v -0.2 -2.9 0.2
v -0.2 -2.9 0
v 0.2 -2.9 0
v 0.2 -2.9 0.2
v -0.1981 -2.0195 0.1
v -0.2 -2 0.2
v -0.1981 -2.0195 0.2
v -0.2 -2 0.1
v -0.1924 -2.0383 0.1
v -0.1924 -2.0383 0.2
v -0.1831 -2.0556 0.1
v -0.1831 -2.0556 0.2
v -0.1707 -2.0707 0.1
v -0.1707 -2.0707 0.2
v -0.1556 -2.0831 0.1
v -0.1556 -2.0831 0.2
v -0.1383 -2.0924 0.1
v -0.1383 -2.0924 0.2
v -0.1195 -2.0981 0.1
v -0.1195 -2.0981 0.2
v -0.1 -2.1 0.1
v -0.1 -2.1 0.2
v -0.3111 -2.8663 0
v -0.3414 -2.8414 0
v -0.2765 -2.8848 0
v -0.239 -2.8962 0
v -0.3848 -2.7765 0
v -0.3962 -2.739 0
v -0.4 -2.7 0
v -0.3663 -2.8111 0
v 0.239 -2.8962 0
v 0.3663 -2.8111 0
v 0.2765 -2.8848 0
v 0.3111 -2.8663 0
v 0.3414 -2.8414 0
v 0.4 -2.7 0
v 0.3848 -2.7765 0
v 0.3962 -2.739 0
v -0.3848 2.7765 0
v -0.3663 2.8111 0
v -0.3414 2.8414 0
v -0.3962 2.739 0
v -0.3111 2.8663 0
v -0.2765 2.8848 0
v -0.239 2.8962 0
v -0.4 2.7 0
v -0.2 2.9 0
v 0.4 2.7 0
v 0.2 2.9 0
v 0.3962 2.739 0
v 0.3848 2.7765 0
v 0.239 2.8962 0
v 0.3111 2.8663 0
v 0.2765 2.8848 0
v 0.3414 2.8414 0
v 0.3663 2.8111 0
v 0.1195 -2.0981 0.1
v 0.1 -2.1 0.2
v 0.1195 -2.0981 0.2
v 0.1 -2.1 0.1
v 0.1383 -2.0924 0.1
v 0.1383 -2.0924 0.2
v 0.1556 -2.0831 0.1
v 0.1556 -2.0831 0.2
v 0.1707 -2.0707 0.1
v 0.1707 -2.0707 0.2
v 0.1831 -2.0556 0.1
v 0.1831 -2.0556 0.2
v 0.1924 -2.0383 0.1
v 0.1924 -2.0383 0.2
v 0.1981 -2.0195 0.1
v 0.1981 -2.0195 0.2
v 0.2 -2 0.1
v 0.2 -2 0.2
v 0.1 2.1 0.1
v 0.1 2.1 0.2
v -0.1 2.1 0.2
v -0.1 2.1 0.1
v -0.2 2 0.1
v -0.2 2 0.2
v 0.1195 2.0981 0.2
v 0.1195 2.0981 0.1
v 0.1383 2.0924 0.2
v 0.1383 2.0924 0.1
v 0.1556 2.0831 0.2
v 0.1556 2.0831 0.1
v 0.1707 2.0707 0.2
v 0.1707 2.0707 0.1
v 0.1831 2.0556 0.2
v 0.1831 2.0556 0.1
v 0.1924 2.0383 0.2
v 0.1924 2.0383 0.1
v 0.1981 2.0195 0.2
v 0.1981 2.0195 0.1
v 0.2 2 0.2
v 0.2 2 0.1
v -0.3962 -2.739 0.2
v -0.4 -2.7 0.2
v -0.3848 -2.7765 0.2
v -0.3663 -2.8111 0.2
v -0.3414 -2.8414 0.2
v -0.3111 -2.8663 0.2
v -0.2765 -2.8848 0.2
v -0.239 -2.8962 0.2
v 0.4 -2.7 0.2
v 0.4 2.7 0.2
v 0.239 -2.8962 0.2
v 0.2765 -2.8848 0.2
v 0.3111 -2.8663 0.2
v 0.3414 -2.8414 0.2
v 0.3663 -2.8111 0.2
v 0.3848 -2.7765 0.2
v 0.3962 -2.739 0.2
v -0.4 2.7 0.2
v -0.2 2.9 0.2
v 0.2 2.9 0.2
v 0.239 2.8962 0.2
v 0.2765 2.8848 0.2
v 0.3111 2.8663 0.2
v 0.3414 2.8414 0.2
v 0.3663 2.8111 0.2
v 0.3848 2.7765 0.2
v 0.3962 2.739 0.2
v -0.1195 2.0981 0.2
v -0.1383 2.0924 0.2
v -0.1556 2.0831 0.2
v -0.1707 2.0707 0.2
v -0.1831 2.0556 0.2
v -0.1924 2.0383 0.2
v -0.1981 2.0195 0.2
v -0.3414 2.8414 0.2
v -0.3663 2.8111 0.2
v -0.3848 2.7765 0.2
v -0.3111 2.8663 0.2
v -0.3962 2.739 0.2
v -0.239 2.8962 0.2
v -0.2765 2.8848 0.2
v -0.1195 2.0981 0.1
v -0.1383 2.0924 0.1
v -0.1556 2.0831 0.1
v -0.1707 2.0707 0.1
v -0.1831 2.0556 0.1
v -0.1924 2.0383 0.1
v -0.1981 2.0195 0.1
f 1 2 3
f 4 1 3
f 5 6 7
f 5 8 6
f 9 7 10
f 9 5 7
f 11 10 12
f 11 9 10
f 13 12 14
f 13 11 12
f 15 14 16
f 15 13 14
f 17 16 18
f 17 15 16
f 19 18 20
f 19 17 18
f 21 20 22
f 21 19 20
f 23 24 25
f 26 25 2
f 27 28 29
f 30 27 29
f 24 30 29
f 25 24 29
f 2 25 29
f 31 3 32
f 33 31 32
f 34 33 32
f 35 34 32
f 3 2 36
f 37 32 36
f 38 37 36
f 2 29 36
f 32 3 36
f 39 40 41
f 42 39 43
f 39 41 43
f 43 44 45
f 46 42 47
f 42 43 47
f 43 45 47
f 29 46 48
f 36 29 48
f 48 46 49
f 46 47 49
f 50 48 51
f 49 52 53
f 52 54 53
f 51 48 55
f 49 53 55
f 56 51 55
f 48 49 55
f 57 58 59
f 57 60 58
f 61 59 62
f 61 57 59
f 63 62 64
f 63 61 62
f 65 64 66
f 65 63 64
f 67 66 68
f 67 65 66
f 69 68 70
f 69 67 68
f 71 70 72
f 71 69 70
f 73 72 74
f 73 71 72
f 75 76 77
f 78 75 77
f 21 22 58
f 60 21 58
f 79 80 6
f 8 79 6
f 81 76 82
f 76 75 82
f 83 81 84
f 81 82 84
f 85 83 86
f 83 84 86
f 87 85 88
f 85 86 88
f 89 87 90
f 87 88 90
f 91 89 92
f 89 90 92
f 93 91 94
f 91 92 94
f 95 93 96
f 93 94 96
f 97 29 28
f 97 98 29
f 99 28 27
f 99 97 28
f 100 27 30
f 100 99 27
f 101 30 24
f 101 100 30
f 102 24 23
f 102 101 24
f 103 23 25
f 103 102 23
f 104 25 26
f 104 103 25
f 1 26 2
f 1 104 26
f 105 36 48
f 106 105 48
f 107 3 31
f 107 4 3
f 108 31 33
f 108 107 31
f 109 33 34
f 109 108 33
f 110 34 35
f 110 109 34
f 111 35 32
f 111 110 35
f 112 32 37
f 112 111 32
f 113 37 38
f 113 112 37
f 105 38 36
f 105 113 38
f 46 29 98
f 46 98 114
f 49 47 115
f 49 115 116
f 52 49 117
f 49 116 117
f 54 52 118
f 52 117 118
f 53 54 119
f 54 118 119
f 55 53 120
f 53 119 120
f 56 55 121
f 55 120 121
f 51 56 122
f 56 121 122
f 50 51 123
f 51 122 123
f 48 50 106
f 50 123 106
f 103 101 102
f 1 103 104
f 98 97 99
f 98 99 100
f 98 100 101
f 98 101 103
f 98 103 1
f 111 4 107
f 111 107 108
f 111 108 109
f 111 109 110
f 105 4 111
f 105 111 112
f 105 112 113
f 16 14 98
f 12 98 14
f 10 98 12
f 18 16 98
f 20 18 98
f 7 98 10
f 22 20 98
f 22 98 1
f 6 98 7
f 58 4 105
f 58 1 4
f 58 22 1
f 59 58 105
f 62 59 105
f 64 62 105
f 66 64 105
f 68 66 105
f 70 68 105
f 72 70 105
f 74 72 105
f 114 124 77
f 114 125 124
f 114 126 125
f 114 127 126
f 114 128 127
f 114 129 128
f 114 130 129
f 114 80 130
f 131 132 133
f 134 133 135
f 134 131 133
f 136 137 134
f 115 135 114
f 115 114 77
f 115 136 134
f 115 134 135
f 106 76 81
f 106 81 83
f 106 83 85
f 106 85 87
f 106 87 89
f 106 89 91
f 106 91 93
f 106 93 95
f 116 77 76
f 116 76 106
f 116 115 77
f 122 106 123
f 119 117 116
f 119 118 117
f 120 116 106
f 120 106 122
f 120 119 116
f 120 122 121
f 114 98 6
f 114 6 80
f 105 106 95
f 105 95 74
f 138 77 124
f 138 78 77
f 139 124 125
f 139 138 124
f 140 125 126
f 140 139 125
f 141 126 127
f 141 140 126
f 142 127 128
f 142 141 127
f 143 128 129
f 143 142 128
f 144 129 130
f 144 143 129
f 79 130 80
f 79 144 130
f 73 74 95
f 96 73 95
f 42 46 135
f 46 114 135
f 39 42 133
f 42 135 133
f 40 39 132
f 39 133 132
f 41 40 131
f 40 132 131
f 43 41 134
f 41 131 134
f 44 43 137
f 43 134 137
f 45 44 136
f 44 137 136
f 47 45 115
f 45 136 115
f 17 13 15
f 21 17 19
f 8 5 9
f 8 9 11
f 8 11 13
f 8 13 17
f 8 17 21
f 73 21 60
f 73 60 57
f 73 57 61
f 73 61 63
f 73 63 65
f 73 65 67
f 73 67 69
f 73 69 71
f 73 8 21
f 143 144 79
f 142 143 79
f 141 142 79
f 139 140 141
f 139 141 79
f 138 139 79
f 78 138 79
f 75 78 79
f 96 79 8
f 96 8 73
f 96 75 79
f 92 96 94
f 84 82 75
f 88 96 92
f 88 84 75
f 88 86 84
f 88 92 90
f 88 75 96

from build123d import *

# Parameters (mm, degrees)
F0_W     = 0.8
F0_H     = 5.8
F1_DEPTH = 0.2
F3_DEPTH = 0.1
F4_R     = 0.2
F5_R     = 0.1


with BuildPart() as f1:
    # F0 (on Top) → F1 (new body)
    with BuildSketch(Plane.XY):
        Rectangle(F0_W, F0_H)
    extrude(amount=F1_DEPTH)

    # F2 (on face) → F3 (cut)
    with BuildSketch(Plane.XY.offset(0.2)):
        Polygon((0.2, 2.1), (0, 2.1), (-0.2, 2.1), (-0.2, -2.1), (0, -2.1), (0.2, -2.1), align=None)
    extrude(amount=-F3_DEPTH, mode=Mode.SUBTRACT)

    # F4
    f4_edges = [f1.edges().sort_by_distance(p)[0] for p in [
        (0.4, 2.9, 0.1),
        (-0.4, 2.9, 0.1),
        (0.4, -2.9, 0.1),
        (-0.4, -2.9, 0.1),
    ]]
    fillet(f4_edges, radius=F4_R)

    # F5
    f5_edges = [f1.edges().sort_by_distance(p)[0] for p in [
        (0.2, 2.1, 0.15),
        (-0.2, 2.1, 0.15),
        (-0.2, -2.1, 0.15),
        (0.2, -2.1, 0.15),
    ]]
    fillet(f5_edges, radius=F5_R)


solid = f1.part
